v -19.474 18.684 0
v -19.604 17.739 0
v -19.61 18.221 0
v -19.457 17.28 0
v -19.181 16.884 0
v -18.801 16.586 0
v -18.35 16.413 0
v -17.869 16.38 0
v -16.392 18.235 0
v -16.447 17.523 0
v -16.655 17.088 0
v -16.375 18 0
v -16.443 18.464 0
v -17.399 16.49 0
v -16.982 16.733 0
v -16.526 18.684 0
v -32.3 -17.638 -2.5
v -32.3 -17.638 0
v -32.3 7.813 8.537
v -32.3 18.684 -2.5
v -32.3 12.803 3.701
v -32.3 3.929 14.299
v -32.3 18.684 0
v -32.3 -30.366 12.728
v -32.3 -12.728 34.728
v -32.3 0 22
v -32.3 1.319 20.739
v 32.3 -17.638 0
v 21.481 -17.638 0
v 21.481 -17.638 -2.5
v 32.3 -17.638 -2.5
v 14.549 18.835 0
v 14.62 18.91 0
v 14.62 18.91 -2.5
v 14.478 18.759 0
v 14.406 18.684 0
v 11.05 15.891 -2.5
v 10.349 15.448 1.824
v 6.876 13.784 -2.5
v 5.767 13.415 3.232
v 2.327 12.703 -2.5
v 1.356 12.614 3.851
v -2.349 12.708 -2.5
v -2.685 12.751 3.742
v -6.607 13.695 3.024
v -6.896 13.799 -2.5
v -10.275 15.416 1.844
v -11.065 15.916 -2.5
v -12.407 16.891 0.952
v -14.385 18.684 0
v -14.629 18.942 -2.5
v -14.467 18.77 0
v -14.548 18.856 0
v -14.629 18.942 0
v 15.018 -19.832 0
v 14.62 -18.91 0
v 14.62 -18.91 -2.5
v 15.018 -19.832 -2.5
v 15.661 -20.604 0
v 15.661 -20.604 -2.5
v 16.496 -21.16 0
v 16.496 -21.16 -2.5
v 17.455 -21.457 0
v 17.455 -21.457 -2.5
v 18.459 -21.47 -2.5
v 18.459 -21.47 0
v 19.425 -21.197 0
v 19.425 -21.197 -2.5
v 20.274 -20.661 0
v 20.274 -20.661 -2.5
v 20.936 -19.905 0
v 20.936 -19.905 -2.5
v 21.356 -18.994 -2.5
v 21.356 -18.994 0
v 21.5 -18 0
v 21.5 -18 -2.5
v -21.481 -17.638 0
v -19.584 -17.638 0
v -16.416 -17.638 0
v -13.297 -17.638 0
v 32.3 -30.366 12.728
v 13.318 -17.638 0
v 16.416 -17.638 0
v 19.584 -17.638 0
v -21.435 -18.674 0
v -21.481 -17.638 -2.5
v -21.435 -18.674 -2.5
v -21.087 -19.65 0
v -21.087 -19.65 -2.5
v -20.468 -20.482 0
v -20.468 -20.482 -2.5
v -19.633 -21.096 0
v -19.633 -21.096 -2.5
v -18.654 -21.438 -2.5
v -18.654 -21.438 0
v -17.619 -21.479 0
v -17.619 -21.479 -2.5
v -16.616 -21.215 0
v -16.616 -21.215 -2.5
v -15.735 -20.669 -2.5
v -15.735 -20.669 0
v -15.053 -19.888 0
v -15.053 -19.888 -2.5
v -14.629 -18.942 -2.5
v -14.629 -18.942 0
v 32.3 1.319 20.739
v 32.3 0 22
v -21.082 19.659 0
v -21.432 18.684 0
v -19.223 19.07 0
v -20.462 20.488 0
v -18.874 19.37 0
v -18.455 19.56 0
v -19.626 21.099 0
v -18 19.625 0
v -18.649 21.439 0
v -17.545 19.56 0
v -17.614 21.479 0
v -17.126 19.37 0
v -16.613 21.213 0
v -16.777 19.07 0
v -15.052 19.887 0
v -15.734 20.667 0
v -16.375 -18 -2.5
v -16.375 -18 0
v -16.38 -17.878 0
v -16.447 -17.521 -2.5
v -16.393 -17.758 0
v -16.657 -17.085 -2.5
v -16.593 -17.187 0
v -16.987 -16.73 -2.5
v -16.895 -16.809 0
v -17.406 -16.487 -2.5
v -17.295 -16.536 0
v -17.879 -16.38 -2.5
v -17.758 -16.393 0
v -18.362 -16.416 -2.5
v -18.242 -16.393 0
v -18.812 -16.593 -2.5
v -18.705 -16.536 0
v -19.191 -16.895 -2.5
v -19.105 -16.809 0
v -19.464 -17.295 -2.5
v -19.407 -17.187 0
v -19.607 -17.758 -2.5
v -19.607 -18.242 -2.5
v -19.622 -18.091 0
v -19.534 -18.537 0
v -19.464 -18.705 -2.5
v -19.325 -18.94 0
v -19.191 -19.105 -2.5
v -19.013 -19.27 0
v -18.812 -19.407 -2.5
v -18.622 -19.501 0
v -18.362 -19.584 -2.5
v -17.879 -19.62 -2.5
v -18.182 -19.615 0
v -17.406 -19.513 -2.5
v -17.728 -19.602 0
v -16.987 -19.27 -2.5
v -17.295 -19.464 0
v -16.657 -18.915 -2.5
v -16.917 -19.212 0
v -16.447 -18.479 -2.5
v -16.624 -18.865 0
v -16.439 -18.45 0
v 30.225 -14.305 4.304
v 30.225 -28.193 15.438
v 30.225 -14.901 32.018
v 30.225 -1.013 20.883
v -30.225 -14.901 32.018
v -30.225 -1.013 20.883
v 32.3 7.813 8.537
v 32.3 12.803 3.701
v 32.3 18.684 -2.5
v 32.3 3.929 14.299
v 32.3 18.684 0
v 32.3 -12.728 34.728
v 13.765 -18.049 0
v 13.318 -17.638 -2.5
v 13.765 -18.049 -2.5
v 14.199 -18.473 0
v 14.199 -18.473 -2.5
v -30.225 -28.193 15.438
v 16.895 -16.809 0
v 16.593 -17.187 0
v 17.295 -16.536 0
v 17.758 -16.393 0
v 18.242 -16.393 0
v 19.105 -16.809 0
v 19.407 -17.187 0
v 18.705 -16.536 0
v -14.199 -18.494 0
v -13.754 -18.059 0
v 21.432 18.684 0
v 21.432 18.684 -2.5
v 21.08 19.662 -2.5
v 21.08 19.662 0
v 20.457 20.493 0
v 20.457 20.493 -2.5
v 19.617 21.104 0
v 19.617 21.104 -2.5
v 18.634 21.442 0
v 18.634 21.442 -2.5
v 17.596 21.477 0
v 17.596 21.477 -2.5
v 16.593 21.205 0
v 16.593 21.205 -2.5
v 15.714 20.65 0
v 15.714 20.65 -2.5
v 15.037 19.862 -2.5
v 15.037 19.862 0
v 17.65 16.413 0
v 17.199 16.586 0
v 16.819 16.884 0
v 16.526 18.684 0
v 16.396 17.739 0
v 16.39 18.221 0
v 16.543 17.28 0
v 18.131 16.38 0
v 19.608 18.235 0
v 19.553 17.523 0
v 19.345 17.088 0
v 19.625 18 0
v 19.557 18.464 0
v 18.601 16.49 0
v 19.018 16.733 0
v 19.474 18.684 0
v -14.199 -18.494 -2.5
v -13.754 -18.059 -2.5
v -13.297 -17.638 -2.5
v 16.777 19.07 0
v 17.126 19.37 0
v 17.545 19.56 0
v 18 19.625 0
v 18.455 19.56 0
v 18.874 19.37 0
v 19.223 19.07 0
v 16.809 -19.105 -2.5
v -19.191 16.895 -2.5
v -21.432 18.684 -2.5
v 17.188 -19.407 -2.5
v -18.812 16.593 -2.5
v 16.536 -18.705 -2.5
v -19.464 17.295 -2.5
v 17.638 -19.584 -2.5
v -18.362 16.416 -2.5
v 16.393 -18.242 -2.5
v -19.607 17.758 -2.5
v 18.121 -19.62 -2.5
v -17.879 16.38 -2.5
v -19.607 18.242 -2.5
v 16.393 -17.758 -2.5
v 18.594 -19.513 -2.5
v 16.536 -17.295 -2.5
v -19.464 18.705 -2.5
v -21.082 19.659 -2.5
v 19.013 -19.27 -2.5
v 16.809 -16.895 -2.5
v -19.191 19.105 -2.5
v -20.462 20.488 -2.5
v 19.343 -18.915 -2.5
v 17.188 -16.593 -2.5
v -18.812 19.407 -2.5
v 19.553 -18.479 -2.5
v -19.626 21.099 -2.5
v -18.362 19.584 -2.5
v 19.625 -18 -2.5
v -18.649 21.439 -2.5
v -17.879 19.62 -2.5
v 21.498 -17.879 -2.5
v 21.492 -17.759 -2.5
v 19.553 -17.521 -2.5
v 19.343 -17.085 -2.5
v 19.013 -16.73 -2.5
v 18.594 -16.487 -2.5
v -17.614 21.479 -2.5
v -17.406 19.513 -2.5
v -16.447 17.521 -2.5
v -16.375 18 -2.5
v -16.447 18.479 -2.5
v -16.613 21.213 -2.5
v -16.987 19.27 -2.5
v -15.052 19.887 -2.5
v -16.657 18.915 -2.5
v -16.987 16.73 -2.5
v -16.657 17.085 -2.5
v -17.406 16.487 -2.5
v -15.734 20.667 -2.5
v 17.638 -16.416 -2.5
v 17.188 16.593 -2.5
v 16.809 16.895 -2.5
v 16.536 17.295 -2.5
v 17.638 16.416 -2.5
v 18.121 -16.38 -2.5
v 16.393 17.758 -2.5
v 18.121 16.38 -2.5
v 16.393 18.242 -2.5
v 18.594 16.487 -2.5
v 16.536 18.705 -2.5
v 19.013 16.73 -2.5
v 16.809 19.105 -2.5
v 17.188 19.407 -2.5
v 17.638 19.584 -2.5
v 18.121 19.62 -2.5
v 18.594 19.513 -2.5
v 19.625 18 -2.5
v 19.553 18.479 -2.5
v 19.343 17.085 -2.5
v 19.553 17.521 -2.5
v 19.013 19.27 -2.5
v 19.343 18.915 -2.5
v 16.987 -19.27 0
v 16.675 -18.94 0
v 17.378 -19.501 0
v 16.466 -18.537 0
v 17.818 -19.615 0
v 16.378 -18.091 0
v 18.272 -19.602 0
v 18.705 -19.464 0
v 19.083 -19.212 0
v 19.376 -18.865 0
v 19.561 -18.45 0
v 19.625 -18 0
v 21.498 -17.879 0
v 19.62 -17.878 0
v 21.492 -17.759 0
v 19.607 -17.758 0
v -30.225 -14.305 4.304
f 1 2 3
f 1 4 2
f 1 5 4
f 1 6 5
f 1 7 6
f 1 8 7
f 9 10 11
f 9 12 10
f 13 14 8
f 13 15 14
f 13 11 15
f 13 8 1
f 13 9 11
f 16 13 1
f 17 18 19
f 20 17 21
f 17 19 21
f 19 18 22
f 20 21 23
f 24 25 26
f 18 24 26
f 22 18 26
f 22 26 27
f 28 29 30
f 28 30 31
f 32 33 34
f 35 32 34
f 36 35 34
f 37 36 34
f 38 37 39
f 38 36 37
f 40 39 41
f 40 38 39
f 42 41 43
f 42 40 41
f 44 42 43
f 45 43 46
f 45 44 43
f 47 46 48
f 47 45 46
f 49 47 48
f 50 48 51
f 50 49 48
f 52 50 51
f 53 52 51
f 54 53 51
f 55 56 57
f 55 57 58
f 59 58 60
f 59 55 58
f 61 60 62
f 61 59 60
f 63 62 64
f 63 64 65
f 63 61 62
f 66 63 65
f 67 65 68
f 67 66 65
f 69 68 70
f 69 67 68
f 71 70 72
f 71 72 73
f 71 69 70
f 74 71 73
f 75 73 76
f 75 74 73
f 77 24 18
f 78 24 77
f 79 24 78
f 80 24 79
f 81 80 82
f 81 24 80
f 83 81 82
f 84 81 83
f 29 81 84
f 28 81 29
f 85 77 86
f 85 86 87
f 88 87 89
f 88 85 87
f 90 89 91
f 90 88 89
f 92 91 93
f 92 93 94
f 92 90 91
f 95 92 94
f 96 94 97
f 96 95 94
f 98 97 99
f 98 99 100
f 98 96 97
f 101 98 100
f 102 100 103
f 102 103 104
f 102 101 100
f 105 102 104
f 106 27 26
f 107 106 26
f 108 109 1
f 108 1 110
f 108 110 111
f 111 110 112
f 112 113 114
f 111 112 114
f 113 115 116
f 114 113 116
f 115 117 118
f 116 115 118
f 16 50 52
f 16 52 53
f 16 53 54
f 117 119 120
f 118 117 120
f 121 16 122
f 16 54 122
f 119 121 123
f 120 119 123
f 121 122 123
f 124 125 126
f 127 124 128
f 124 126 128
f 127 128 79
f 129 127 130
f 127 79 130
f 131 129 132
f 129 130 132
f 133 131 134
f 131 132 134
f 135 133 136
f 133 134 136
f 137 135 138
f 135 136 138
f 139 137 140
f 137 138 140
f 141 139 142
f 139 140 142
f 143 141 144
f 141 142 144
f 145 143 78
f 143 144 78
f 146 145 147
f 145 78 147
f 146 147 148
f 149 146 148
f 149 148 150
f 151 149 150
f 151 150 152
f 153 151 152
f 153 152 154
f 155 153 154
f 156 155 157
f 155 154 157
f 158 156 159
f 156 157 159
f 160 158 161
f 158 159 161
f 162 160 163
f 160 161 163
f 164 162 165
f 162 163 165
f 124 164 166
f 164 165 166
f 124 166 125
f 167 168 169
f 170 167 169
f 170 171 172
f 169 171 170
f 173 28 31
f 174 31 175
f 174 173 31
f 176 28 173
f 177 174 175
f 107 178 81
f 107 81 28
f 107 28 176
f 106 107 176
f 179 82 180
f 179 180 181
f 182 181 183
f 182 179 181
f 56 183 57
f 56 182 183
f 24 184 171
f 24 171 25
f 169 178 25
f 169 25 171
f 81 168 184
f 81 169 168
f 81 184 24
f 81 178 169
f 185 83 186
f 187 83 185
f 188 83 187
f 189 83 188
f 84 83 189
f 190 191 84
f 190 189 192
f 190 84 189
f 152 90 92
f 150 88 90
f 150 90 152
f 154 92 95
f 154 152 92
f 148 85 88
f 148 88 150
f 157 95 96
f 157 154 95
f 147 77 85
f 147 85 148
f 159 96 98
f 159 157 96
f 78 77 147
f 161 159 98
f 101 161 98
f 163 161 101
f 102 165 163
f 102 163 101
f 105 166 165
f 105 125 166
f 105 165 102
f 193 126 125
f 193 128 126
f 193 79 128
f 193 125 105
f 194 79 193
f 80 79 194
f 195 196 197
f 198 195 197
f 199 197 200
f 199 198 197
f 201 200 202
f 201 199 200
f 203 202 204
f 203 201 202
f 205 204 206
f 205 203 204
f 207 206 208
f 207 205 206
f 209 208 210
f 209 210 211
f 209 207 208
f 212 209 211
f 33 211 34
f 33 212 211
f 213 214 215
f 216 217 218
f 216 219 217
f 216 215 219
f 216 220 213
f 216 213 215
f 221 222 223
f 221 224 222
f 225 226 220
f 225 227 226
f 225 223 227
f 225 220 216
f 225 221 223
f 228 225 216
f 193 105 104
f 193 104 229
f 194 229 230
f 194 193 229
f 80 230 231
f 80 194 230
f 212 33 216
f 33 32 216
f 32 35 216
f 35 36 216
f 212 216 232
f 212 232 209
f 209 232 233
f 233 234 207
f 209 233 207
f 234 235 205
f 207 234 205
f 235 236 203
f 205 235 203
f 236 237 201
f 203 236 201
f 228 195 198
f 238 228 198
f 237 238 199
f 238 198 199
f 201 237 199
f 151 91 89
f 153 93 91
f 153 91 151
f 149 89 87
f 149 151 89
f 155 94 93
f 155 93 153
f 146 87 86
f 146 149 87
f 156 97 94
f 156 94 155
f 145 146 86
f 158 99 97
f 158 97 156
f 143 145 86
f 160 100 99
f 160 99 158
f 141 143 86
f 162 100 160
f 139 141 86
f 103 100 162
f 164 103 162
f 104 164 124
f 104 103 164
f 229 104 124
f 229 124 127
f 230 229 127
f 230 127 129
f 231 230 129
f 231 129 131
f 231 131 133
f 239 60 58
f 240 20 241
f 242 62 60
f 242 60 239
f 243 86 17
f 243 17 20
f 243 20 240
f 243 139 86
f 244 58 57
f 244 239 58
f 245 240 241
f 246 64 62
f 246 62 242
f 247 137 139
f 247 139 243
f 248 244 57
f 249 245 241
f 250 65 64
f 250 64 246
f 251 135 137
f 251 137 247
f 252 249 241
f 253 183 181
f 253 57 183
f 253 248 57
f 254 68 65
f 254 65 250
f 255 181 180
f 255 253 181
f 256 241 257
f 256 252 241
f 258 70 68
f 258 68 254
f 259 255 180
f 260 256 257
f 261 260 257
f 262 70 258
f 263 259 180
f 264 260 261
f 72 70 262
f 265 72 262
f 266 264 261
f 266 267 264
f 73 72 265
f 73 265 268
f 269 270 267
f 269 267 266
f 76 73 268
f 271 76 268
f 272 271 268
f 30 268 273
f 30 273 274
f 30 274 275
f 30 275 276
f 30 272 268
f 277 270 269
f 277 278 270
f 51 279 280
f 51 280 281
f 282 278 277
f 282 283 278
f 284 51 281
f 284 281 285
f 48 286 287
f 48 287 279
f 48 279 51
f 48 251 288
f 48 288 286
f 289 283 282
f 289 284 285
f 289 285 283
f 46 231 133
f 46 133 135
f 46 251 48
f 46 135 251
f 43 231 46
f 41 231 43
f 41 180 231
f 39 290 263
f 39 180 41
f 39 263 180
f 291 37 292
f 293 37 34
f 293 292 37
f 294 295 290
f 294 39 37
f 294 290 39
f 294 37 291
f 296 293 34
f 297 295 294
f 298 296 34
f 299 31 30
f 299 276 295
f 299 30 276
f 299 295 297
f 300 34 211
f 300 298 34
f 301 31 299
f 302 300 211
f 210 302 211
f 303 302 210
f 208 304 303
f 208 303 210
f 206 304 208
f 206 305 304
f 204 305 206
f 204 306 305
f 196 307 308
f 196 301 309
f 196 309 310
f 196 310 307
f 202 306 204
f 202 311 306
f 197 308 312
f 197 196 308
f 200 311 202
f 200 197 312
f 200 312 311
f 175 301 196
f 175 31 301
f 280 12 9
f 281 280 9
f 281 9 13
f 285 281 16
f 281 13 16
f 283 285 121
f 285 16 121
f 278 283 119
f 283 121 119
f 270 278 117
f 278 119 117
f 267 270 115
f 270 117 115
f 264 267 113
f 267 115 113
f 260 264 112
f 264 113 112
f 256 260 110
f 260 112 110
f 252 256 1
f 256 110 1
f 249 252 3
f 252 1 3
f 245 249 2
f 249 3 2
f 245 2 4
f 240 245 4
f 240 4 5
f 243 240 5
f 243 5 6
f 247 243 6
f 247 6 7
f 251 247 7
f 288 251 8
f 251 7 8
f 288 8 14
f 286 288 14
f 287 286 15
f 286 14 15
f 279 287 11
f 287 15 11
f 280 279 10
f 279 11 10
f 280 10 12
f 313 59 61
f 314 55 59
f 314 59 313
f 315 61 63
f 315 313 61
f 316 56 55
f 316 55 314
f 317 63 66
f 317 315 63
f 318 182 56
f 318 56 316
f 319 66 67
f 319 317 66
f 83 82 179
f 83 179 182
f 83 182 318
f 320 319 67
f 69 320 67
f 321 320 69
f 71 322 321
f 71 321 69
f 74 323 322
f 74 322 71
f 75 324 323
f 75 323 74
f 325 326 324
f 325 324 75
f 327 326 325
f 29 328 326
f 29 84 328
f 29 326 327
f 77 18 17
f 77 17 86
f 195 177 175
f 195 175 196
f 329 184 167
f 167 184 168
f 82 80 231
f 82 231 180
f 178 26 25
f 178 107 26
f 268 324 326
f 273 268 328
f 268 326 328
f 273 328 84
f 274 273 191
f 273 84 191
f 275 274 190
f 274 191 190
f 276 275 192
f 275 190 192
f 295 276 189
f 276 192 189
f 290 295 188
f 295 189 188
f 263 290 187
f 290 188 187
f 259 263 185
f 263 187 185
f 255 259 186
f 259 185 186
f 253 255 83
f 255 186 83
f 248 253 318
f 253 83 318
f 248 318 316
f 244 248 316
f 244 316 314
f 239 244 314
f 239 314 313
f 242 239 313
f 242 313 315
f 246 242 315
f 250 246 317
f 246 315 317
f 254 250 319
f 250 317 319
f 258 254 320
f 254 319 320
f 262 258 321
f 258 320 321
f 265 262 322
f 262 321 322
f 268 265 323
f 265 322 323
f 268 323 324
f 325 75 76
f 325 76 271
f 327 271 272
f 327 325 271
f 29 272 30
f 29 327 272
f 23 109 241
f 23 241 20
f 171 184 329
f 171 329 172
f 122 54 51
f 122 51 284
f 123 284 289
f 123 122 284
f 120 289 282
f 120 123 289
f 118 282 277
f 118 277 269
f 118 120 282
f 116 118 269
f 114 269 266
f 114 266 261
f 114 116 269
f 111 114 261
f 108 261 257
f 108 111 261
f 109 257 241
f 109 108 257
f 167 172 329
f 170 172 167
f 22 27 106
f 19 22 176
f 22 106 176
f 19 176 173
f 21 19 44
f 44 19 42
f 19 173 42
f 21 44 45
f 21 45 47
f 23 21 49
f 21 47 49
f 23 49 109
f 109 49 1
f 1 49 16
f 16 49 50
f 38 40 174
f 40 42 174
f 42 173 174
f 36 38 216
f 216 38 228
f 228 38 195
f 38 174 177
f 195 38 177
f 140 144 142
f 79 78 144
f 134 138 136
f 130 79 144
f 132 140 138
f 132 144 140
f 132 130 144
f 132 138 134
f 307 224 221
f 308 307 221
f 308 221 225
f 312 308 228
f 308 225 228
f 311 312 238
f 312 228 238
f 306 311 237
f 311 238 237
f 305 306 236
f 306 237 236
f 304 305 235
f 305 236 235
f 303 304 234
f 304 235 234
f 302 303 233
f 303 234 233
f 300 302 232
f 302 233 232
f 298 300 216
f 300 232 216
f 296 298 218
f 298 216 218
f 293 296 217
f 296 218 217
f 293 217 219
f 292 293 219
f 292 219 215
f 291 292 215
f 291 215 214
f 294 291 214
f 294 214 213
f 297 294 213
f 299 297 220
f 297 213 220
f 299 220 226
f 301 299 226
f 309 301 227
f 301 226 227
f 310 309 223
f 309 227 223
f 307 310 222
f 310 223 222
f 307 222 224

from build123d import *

# Parameters (mm, degrees)
F2_DEPTH  = 32.3
F3_DEPTH  = 32.3
F4_W      = 60.45
F4_H      = 21.25
F5_DEPTH  = 17.8
F0_R      = 1.625
F7_DEPTH  = 2.5
F8_DEPTH  = 125
F9_DEPTH  = 25
F10_DEPTH = 2.5


with BuildPart() as f2:
    # F1 (on Right) → F2 (new body)
    with BuildSketch(Plane.YZ):
        Polygon((-30.3661038332, 12.7279220614), (-17.6381817718, 0), (23, 0), (0, 22), (-12.7279220614, 34.7279220614), align=None)
    extrude(amount=F2_DEPTH)

    # F3 (add): a face of the model
    f3_faces = [f2.faces().sort_by_distance(p)[0] for p in [
        (0, -7.2105643806, 12.6516732047),
    ]]
    extrude(f3_faces, amount=F3_DEPTH)

    # F4 (on face) → F5 (cut)
    with BuildSketch(Plane(origin=(0, -24.6962676026, 19.7998753209), x_dir=(1, 0, 0), z_dir=(0, -0.780207847, 0.6255203557))):
        with Locations((0, 5.0346157827)):
            Rectangle(F4_W, F4_H)
    extrude(amount=-F5_DEPTH, mode=Mode.SUBTRACT)

    # F0 (on Top) → F7 (join)
    with BuildSketch(Plane.XY):
        with BuildLine():
            ThreePointArc((-18.8683877308, 14.6094391689), (-15.8539987253, 15.2350988211), (-14.5, 18))
            ThreePointArc((-14.5, 18), (-14.5324686308, 18.4756324252), (-14.6292721165, 18.9424402026))
            ThreePointArc((-14.6292721165, 18.9424402026), (-20.5018295404, 20.4476210799), (-18.8683877308, 14.6094391689))
        make_face()
        with Locations((-18, 18)):
            Circle(F0_R, mode=Mode.SUBTRACT)
        with BuildLine():
            ThreePointArc((-14.6292721165, 18.9424402026), (-14.5324686308, 18.4756324252), (-14.5, 18))
            ThreePointArc((-14.5, 18), (-15.8539987253, 15.2350988211), (-18.8683877308, 14.6094391689))
            ThreePointArc((-18.8683877308, 14.6094391689), (-12.4958401108, 0.0286551223), (-18.7836705303, -14.5888622866))
            ThreePointArc((-18.7836705303, -14.5888622866), (-15.8197301608, -15.26204028), (-14.5, -18))
            ThreePointArc((-14.5, -18), (-14.5324686308, -18.4756324252), (-14.6292721165, -18.9424402026))
            ThreePointArc((-14.6292721165, -18.9424402026), (-0.0113565012, -12.5687447065), (14.6204813838, -18.9104141492))
            ThreePointArc((14.6204813838, -18.9104141492), (15.4793732037, -15.5717412507), (18.7836705303, -14.5888622866))
            ThreePointArc((18.7836705303, -14.5888622866), (12.4958401108, 0.0286551223), (18.8683877308, 14.6094391689))
            ThreePointArc((18.8683877308, 14.6094391689), (15.5098110461, 15.5405368525), (14.6204813838, 18.9104141492))
            ThreePointArc((14.6204813838, 18.9104141492), (-0.0113565012, 12.5687447065), (-14.6292721165, 18.9424402026))
        make_face()
        with BuildLine():
            ThreePointArc((21.5, 18), (18.459175807, 21.4697489215), (14.6204813838, 18.9104141492))
            ThreePointArc((14.6204813838, 18.9104141492), (15.5098110461, 15.5405368525), (18.8683877308, 14.6094391689))
            ThreePointArc((18.8683877308, 14.6094391689), (20.7649011789, 15.8539987253), (21.5, 18))
        make_face()
        with Locations((18, 18)):
            Circle(F0_R, mode=Mode.SUBTRACT)
        with BuildLine():
            ThreePointArc((-14.5, -18), (-15.8197301608, -15.26204028), (-18.7836705303, -14.5888622866))
            ThreePointArc((-18.7836705303, -14.5888622866), (-20.532118995, -20.4162726243), (-14.6292721165, -18.9424402026))
            ThreePointArc((-14.6292721165, -18.9424402026), (-14.5324686308, -18.4756324252), (-14.5, -18))
        make_face()
        with Locations((-18, -18)):
            Circle(F0_R, mode=Mode.SUBTRACT)
        with BuildLine():
            ThreePointArc((21.5, -18), (20.73795972, -15.8197301608), (18.7836705303, -14.5888622866))
            ThreePointArc((18.7836705303, -14.5888622866), (15.4793732037, -15.5717412507), (14.6204813838, -18.9104141492))
            ThreePointArc((14.6204813838, -18.9104141492), (18.459175807, -21.4697489215), (21.5, -18))
        make_face()
        with Locations((18, -18)):
            Circle(F0_R, mode=Mode.SUBTRACT)
    extrude(amount=-F7_DEPTH)

    # F6 (on face) → F8 (cut)
    with BuildSketch(Plane.YZ.offset(32.3)):
        with BuildLine():
            Line((23, 0), (1.3185644747, 20.7387644155))
            ThreePointArc((1.3185644747, 20.7387644155), (7.8131331228, 8.5369425815), (18.6844021082, 0))
            Line((18.6844021082, 0), (23, 0))
        make_face()
    extrude(amount=-F8_DEPTH, mode=Mode.SUBTRACT)

    # F9 (cut): a face of the model
    f9_faces = [f2.faces().sort_by_distance(p)[0] for p in [
        (0.0105418264, 16.2029444185, 0),
    ]]
    extrude(f9_faces, amount=-F9_DEPTH, mode=Mode.SUBTRACT)

    # F10 (add, through all): faces of the model
    f10_faces = [f2.faces().sort_by_distance(p)[0] for p in [
        (23.7244305893, 0.3347471948, 0),
        (-23.7244305893, 0.3347471948, 0),
        (0.0105418264, -15.5866223713, 0),
    ]]
    extrude(f10_faces, amount=F10_DEPTH)


solid = f2.part
